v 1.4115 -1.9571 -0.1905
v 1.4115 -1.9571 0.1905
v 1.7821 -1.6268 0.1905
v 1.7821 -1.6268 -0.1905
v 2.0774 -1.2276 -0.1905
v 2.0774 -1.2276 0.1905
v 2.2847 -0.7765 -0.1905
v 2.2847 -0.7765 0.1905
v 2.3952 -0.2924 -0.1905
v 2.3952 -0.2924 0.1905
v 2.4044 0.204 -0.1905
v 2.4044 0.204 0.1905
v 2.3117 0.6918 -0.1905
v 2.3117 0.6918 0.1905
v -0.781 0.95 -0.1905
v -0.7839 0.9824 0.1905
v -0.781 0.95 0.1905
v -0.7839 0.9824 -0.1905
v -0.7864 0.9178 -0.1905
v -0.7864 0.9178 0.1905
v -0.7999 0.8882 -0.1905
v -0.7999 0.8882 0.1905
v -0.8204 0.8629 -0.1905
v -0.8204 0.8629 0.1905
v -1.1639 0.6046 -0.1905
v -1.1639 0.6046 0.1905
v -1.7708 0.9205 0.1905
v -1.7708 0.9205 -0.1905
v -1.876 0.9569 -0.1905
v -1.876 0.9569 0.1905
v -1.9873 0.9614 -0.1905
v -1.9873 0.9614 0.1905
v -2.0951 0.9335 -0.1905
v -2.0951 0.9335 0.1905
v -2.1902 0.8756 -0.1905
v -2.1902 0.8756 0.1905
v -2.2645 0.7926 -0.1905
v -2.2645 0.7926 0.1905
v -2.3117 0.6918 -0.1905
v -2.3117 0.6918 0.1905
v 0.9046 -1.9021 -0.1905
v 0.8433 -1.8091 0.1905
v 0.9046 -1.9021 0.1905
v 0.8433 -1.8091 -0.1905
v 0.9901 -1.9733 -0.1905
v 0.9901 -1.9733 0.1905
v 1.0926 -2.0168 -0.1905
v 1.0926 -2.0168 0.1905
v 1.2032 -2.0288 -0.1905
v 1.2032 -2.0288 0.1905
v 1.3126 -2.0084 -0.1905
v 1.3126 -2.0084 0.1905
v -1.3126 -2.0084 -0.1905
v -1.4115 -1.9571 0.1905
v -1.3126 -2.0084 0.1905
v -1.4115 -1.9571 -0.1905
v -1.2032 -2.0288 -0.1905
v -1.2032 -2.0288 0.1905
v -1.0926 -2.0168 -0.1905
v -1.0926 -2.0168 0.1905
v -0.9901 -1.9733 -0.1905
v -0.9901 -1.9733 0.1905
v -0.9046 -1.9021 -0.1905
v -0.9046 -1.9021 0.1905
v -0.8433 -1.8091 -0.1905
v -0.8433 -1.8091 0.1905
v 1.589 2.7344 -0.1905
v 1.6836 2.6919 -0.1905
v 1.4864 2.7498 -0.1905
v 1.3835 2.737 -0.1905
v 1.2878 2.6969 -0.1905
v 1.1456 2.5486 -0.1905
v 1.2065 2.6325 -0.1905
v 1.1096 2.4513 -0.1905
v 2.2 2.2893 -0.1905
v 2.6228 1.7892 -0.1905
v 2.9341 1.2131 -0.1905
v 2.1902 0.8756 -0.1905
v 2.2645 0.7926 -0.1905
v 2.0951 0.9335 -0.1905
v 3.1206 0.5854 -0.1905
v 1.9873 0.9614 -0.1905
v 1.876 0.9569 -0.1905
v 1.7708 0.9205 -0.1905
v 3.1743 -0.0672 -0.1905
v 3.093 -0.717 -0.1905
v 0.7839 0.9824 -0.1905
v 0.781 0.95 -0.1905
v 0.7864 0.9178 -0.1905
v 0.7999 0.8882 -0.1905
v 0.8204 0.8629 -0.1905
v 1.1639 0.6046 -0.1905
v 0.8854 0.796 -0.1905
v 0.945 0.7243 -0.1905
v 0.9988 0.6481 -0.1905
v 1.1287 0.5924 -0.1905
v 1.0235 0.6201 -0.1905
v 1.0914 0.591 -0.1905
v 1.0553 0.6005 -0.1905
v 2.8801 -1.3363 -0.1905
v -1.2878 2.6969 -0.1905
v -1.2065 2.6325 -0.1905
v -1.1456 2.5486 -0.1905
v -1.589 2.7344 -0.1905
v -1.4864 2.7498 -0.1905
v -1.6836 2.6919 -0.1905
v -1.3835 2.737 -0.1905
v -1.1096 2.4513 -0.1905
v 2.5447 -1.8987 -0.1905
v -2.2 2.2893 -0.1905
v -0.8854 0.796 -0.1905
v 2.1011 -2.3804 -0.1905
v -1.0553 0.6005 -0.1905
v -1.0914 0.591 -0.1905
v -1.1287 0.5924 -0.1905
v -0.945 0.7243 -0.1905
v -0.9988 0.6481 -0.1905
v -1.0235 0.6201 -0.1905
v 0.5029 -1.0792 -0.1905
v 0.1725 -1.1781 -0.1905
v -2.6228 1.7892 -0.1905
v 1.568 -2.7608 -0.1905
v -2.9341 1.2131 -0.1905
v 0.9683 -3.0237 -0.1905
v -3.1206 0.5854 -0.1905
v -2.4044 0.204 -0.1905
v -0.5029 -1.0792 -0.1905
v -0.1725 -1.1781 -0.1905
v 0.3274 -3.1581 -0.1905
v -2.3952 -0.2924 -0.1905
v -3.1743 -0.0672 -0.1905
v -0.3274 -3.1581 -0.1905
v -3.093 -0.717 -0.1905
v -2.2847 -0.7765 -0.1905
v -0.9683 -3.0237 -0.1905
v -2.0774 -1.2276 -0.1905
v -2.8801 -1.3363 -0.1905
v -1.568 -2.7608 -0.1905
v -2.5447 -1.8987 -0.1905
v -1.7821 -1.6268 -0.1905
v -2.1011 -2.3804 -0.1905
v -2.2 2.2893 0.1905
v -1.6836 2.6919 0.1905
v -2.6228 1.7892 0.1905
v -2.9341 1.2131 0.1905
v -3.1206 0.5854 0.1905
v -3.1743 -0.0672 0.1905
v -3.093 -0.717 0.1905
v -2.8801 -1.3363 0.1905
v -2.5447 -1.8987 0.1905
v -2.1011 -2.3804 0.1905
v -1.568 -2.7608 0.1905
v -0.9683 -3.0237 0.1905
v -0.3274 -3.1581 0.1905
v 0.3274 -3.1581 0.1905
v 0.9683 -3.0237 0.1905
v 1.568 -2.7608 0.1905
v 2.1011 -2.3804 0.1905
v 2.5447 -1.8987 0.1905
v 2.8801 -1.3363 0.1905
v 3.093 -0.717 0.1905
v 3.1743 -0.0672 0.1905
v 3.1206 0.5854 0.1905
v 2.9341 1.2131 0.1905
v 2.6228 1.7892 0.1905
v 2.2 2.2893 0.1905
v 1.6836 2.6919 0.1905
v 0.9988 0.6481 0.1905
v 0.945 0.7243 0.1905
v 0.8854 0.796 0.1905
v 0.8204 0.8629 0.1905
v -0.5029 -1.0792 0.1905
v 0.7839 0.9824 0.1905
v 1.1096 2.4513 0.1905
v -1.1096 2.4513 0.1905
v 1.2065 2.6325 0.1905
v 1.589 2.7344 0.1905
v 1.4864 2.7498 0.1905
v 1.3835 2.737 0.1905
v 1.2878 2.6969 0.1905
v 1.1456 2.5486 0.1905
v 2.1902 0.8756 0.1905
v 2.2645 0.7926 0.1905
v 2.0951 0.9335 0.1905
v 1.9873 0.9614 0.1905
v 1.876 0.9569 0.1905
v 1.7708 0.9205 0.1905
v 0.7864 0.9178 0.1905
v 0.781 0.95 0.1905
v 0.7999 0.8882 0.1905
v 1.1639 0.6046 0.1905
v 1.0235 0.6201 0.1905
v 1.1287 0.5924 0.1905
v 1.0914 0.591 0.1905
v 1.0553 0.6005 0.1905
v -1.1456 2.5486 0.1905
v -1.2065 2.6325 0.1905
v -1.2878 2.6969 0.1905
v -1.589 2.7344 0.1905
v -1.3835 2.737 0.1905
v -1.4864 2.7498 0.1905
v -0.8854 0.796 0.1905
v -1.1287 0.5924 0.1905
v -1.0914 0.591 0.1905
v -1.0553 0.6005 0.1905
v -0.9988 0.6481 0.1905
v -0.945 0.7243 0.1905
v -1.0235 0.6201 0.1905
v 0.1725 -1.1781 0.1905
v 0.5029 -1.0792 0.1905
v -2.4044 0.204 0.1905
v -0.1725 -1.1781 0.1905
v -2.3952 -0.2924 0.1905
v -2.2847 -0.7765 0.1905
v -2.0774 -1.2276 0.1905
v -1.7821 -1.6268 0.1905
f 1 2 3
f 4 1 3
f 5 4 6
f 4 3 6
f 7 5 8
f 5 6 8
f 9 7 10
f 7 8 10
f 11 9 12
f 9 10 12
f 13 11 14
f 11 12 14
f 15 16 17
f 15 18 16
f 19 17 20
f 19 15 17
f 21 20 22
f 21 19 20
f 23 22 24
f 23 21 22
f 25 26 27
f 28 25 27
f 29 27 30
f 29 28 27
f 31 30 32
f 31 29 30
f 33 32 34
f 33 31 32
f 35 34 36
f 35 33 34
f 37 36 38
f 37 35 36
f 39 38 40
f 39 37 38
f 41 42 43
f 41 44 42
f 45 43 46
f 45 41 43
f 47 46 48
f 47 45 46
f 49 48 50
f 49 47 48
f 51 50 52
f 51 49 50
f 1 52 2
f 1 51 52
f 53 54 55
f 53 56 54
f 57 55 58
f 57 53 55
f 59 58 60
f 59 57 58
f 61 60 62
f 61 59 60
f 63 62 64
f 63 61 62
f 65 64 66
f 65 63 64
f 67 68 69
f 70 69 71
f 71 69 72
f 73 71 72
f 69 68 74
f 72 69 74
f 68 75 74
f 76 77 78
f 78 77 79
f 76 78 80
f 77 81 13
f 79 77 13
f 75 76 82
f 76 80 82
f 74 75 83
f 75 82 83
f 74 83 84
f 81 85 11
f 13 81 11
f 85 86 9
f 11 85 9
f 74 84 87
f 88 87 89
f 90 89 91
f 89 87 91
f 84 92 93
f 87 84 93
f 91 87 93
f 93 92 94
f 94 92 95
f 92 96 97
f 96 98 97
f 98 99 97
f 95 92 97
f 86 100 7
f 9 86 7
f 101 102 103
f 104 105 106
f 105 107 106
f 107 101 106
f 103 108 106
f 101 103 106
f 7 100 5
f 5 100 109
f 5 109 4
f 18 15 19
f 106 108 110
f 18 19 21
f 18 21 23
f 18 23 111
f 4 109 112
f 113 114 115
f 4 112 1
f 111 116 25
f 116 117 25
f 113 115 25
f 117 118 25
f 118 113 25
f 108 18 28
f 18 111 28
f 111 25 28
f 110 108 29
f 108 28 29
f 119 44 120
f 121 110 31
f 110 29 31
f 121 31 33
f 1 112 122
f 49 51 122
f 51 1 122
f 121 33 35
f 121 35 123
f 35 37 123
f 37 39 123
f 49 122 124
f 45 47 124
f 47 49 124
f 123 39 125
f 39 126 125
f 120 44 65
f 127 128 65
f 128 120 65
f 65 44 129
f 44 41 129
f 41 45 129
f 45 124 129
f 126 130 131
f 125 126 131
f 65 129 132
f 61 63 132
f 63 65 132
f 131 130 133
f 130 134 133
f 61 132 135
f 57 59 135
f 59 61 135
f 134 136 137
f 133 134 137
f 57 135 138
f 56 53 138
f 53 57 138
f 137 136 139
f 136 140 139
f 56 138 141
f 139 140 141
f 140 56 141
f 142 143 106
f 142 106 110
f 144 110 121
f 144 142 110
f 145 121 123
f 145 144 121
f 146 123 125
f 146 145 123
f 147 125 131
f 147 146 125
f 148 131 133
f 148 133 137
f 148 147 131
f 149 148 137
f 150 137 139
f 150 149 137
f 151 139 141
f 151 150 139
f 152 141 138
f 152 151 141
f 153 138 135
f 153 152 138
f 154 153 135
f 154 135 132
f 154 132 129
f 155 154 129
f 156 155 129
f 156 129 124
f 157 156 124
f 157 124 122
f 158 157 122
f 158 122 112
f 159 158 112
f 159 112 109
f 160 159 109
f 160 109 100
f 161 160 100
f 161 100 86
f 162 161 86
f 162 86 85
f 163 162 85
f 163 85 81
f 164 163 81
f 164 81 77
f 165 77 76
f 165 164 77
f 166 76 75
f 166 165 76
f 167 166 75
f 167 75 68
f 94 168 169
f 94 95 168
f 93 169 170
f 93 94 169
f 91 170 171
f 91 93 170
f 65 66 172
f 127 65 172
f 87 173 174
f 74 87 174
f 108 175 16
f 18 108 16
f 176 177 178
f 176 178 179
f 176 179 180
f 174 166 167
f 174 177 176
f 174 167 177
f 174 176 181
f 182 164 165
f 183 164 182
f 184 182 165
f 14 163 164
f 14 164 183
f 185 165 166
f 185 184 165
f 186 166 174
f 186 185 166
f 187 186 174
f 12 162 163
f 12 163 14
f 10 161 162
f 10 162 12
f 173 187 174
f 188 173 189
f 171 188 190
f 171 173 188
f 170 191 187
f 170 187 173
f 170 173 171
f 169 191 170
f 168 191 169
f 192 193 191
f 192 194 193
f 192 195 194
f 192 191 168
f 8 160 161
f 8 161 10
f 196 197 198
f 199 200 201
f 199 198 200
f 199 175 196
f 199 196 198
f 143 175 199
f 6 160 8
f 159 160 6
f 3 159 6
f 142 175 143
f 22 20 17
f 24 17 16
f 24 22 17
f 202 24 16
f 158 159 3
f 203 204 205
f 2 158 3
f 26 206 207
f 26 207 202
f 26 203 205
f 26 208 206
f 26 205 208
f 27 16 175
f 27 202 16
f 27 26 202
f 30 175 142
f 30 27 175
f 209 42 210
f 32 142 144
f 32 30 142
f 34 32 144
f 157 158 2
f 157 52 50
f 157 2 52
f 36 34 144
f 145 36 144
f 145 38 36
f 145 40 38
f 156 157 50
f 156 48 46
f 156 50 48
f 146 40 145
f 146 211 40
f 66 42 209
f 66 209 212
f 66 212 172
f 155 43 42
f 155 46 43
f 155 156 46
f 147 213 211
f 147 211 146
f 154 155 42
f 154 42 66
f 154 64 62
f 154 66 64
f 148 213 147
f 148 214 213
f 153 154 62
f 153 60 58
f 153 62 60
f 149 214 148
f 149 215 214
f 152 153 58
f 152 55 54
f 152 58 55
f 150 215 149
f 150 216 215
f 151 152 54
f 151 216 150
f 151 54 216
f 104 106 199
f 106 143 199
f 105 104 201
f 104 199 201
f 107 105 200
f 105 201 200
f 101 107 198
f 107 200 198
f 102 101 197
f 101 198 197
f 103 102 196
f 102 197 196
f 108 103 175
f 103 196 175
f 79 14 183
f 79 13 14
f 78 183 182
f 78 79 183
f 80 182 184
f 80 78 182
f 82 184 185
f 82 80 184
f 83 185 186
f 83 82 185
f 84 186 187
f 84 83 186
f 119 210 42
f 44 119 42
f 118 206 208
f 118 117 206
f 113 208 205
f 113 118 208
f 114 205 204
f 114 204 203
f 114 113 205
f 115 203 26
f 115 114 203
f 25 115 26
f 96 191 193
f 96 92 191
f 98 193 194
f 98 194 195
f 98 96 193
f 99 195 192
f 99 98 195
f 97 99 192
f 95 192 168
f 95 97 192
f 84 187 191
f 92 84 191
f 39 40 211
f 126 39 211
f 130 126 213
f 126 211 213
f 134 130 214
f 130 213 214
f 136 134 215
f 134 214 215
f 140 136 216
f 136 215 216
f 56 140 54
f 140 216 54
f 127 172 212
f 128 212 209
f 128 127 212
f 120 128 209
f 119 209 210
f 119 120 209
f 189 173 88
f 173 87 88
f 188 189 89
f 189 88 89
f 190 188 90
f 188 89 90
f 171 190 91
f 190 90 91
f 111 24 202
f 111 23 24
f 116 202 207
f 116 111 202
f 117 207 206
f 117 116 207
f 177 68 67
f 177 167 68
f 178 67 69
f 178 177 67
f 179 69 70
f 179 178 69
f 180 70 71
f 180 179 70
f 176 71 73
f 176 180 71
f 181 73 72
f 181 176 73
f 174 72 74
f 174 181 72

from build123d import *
from OCP.BRepFilletAPI import BRepFilletAPI_MakeFillet

# Parameters (mm, degrees)
SKETCH1_R           = 3.175
SKETCH1_R_2         = 1.190625
BOSS_EXTRUDE1_DEPTH = 0.1905
CUT_EXTRUDE1_DEPTH  = 5.50626353
CUT_EXTRUDE2_DEPTH  = 5.50626353
FILLET1_R1          = 0.381
FILLET1_R2          = 0.127


with BuildPart() as part:
    # Sketch1 → Boss-Extrude1 (new, symmetric)
    with BuildSketch(Plane.XY):
        Circle(SKETCH1_R)
        Circle(SKETCH1_R_2, mode=Mode.SUBTRACT)
    extrude(amount=BOSS_EXTRUDE1_DEPTH, both=True)

    # Sketch2 → Cut-Extrude1 (cut, through all)
    with BuildSketch(Plane.XY.offset(0.1905)):
        Polygon((-0.635, 0.3107001), (0.635, 0.3107001), (1.27, 3.175), (-1.27, 3.175), align=None)
    extrude(amount=-CUT_EXTRUDE1_DEPTH, mode=Mode.SUBTRACT)

    # Sketch3 → Cut-Extrude2 (cut, through all)
    with BuildSketch(Plane.XY.offset(0.1905)):
        with BuildLine():
            Line((-1.05664, 0.548725615), (-2.140900128, 1.113155712))
            ThreePointArc((-2.140900128, 1.113155712), (-2.284707131, -0.776326171), (-1.019518005, -2.187041846))
            Line((-1.019518005, -2.187041846), (-0.50292, -1.079193849))
            ThreePointArc((-0.50292, -1.079193849), (-1.127203307, -0.383406568), (-1.05664, 0.548725615))
        make_face()
        with BuildLine():
            Line((0.50292, -1.079193849), (1.019518005, -2.187041846))
            ThreePointArc((1.019518005, -2.187041846), (2.284707131, -0.776326171), (2.140900128, 1.113155712))
            Line((2.140900128, 1.113155712), (1.05664, 0.548725615))
            ThreePointArc((1.05664, 0.548725615), (1.127203307, -0.383406568), (0.50292, -1.079193849))
        make_face()
    extrude(amount=-CUT_EXTRUDE2_DEPTH, mode=Mode.SUBTRACT)

    # Fillet1: one fillet with a radius per group of edges: ONE call of the kernel's fillet builder (fillet() takes one radius for all edges)
    fillet1_edges_1 = [part.edges().sort_by_distance(p)[0] for p in [
        (-1.216302436, 2.932785942, 0),
        (-2.140900128, 1.113155712, 0),
        (-1.019518005, -2.187041846, 0),
        (1.019518005, -2.187041846, 0),
        (2.140900128, 1.113155712, 0),
        (1.216302436, 2.932785942, 0),
    ]]
    fillet1_edges_2 = [part.edges().sort_by_distance(p)[0] for p in [
        (-0.767848913, 0.909942821, 0),
        (-1.05664, 0.548725615, 0),
        (0.767848913, 0.909942821, 0),
        (1.05664, 0.548725615, 0),
    ]]
    fillet1 = BRepFilletAPI_MakeFillet(part.part.solid().wrapped)
    for e in fillet1_edges_1:
        fillet1.Add(FILLET1_R1, e.wrapped)
    for e in fillet1_edges_2:
        fillet1.Add(FILLET1_R2, e.wrapped)
    add(Compound.cast(fillet1.Shape()), mode=Mode.REPLACE)


solid = part.part
